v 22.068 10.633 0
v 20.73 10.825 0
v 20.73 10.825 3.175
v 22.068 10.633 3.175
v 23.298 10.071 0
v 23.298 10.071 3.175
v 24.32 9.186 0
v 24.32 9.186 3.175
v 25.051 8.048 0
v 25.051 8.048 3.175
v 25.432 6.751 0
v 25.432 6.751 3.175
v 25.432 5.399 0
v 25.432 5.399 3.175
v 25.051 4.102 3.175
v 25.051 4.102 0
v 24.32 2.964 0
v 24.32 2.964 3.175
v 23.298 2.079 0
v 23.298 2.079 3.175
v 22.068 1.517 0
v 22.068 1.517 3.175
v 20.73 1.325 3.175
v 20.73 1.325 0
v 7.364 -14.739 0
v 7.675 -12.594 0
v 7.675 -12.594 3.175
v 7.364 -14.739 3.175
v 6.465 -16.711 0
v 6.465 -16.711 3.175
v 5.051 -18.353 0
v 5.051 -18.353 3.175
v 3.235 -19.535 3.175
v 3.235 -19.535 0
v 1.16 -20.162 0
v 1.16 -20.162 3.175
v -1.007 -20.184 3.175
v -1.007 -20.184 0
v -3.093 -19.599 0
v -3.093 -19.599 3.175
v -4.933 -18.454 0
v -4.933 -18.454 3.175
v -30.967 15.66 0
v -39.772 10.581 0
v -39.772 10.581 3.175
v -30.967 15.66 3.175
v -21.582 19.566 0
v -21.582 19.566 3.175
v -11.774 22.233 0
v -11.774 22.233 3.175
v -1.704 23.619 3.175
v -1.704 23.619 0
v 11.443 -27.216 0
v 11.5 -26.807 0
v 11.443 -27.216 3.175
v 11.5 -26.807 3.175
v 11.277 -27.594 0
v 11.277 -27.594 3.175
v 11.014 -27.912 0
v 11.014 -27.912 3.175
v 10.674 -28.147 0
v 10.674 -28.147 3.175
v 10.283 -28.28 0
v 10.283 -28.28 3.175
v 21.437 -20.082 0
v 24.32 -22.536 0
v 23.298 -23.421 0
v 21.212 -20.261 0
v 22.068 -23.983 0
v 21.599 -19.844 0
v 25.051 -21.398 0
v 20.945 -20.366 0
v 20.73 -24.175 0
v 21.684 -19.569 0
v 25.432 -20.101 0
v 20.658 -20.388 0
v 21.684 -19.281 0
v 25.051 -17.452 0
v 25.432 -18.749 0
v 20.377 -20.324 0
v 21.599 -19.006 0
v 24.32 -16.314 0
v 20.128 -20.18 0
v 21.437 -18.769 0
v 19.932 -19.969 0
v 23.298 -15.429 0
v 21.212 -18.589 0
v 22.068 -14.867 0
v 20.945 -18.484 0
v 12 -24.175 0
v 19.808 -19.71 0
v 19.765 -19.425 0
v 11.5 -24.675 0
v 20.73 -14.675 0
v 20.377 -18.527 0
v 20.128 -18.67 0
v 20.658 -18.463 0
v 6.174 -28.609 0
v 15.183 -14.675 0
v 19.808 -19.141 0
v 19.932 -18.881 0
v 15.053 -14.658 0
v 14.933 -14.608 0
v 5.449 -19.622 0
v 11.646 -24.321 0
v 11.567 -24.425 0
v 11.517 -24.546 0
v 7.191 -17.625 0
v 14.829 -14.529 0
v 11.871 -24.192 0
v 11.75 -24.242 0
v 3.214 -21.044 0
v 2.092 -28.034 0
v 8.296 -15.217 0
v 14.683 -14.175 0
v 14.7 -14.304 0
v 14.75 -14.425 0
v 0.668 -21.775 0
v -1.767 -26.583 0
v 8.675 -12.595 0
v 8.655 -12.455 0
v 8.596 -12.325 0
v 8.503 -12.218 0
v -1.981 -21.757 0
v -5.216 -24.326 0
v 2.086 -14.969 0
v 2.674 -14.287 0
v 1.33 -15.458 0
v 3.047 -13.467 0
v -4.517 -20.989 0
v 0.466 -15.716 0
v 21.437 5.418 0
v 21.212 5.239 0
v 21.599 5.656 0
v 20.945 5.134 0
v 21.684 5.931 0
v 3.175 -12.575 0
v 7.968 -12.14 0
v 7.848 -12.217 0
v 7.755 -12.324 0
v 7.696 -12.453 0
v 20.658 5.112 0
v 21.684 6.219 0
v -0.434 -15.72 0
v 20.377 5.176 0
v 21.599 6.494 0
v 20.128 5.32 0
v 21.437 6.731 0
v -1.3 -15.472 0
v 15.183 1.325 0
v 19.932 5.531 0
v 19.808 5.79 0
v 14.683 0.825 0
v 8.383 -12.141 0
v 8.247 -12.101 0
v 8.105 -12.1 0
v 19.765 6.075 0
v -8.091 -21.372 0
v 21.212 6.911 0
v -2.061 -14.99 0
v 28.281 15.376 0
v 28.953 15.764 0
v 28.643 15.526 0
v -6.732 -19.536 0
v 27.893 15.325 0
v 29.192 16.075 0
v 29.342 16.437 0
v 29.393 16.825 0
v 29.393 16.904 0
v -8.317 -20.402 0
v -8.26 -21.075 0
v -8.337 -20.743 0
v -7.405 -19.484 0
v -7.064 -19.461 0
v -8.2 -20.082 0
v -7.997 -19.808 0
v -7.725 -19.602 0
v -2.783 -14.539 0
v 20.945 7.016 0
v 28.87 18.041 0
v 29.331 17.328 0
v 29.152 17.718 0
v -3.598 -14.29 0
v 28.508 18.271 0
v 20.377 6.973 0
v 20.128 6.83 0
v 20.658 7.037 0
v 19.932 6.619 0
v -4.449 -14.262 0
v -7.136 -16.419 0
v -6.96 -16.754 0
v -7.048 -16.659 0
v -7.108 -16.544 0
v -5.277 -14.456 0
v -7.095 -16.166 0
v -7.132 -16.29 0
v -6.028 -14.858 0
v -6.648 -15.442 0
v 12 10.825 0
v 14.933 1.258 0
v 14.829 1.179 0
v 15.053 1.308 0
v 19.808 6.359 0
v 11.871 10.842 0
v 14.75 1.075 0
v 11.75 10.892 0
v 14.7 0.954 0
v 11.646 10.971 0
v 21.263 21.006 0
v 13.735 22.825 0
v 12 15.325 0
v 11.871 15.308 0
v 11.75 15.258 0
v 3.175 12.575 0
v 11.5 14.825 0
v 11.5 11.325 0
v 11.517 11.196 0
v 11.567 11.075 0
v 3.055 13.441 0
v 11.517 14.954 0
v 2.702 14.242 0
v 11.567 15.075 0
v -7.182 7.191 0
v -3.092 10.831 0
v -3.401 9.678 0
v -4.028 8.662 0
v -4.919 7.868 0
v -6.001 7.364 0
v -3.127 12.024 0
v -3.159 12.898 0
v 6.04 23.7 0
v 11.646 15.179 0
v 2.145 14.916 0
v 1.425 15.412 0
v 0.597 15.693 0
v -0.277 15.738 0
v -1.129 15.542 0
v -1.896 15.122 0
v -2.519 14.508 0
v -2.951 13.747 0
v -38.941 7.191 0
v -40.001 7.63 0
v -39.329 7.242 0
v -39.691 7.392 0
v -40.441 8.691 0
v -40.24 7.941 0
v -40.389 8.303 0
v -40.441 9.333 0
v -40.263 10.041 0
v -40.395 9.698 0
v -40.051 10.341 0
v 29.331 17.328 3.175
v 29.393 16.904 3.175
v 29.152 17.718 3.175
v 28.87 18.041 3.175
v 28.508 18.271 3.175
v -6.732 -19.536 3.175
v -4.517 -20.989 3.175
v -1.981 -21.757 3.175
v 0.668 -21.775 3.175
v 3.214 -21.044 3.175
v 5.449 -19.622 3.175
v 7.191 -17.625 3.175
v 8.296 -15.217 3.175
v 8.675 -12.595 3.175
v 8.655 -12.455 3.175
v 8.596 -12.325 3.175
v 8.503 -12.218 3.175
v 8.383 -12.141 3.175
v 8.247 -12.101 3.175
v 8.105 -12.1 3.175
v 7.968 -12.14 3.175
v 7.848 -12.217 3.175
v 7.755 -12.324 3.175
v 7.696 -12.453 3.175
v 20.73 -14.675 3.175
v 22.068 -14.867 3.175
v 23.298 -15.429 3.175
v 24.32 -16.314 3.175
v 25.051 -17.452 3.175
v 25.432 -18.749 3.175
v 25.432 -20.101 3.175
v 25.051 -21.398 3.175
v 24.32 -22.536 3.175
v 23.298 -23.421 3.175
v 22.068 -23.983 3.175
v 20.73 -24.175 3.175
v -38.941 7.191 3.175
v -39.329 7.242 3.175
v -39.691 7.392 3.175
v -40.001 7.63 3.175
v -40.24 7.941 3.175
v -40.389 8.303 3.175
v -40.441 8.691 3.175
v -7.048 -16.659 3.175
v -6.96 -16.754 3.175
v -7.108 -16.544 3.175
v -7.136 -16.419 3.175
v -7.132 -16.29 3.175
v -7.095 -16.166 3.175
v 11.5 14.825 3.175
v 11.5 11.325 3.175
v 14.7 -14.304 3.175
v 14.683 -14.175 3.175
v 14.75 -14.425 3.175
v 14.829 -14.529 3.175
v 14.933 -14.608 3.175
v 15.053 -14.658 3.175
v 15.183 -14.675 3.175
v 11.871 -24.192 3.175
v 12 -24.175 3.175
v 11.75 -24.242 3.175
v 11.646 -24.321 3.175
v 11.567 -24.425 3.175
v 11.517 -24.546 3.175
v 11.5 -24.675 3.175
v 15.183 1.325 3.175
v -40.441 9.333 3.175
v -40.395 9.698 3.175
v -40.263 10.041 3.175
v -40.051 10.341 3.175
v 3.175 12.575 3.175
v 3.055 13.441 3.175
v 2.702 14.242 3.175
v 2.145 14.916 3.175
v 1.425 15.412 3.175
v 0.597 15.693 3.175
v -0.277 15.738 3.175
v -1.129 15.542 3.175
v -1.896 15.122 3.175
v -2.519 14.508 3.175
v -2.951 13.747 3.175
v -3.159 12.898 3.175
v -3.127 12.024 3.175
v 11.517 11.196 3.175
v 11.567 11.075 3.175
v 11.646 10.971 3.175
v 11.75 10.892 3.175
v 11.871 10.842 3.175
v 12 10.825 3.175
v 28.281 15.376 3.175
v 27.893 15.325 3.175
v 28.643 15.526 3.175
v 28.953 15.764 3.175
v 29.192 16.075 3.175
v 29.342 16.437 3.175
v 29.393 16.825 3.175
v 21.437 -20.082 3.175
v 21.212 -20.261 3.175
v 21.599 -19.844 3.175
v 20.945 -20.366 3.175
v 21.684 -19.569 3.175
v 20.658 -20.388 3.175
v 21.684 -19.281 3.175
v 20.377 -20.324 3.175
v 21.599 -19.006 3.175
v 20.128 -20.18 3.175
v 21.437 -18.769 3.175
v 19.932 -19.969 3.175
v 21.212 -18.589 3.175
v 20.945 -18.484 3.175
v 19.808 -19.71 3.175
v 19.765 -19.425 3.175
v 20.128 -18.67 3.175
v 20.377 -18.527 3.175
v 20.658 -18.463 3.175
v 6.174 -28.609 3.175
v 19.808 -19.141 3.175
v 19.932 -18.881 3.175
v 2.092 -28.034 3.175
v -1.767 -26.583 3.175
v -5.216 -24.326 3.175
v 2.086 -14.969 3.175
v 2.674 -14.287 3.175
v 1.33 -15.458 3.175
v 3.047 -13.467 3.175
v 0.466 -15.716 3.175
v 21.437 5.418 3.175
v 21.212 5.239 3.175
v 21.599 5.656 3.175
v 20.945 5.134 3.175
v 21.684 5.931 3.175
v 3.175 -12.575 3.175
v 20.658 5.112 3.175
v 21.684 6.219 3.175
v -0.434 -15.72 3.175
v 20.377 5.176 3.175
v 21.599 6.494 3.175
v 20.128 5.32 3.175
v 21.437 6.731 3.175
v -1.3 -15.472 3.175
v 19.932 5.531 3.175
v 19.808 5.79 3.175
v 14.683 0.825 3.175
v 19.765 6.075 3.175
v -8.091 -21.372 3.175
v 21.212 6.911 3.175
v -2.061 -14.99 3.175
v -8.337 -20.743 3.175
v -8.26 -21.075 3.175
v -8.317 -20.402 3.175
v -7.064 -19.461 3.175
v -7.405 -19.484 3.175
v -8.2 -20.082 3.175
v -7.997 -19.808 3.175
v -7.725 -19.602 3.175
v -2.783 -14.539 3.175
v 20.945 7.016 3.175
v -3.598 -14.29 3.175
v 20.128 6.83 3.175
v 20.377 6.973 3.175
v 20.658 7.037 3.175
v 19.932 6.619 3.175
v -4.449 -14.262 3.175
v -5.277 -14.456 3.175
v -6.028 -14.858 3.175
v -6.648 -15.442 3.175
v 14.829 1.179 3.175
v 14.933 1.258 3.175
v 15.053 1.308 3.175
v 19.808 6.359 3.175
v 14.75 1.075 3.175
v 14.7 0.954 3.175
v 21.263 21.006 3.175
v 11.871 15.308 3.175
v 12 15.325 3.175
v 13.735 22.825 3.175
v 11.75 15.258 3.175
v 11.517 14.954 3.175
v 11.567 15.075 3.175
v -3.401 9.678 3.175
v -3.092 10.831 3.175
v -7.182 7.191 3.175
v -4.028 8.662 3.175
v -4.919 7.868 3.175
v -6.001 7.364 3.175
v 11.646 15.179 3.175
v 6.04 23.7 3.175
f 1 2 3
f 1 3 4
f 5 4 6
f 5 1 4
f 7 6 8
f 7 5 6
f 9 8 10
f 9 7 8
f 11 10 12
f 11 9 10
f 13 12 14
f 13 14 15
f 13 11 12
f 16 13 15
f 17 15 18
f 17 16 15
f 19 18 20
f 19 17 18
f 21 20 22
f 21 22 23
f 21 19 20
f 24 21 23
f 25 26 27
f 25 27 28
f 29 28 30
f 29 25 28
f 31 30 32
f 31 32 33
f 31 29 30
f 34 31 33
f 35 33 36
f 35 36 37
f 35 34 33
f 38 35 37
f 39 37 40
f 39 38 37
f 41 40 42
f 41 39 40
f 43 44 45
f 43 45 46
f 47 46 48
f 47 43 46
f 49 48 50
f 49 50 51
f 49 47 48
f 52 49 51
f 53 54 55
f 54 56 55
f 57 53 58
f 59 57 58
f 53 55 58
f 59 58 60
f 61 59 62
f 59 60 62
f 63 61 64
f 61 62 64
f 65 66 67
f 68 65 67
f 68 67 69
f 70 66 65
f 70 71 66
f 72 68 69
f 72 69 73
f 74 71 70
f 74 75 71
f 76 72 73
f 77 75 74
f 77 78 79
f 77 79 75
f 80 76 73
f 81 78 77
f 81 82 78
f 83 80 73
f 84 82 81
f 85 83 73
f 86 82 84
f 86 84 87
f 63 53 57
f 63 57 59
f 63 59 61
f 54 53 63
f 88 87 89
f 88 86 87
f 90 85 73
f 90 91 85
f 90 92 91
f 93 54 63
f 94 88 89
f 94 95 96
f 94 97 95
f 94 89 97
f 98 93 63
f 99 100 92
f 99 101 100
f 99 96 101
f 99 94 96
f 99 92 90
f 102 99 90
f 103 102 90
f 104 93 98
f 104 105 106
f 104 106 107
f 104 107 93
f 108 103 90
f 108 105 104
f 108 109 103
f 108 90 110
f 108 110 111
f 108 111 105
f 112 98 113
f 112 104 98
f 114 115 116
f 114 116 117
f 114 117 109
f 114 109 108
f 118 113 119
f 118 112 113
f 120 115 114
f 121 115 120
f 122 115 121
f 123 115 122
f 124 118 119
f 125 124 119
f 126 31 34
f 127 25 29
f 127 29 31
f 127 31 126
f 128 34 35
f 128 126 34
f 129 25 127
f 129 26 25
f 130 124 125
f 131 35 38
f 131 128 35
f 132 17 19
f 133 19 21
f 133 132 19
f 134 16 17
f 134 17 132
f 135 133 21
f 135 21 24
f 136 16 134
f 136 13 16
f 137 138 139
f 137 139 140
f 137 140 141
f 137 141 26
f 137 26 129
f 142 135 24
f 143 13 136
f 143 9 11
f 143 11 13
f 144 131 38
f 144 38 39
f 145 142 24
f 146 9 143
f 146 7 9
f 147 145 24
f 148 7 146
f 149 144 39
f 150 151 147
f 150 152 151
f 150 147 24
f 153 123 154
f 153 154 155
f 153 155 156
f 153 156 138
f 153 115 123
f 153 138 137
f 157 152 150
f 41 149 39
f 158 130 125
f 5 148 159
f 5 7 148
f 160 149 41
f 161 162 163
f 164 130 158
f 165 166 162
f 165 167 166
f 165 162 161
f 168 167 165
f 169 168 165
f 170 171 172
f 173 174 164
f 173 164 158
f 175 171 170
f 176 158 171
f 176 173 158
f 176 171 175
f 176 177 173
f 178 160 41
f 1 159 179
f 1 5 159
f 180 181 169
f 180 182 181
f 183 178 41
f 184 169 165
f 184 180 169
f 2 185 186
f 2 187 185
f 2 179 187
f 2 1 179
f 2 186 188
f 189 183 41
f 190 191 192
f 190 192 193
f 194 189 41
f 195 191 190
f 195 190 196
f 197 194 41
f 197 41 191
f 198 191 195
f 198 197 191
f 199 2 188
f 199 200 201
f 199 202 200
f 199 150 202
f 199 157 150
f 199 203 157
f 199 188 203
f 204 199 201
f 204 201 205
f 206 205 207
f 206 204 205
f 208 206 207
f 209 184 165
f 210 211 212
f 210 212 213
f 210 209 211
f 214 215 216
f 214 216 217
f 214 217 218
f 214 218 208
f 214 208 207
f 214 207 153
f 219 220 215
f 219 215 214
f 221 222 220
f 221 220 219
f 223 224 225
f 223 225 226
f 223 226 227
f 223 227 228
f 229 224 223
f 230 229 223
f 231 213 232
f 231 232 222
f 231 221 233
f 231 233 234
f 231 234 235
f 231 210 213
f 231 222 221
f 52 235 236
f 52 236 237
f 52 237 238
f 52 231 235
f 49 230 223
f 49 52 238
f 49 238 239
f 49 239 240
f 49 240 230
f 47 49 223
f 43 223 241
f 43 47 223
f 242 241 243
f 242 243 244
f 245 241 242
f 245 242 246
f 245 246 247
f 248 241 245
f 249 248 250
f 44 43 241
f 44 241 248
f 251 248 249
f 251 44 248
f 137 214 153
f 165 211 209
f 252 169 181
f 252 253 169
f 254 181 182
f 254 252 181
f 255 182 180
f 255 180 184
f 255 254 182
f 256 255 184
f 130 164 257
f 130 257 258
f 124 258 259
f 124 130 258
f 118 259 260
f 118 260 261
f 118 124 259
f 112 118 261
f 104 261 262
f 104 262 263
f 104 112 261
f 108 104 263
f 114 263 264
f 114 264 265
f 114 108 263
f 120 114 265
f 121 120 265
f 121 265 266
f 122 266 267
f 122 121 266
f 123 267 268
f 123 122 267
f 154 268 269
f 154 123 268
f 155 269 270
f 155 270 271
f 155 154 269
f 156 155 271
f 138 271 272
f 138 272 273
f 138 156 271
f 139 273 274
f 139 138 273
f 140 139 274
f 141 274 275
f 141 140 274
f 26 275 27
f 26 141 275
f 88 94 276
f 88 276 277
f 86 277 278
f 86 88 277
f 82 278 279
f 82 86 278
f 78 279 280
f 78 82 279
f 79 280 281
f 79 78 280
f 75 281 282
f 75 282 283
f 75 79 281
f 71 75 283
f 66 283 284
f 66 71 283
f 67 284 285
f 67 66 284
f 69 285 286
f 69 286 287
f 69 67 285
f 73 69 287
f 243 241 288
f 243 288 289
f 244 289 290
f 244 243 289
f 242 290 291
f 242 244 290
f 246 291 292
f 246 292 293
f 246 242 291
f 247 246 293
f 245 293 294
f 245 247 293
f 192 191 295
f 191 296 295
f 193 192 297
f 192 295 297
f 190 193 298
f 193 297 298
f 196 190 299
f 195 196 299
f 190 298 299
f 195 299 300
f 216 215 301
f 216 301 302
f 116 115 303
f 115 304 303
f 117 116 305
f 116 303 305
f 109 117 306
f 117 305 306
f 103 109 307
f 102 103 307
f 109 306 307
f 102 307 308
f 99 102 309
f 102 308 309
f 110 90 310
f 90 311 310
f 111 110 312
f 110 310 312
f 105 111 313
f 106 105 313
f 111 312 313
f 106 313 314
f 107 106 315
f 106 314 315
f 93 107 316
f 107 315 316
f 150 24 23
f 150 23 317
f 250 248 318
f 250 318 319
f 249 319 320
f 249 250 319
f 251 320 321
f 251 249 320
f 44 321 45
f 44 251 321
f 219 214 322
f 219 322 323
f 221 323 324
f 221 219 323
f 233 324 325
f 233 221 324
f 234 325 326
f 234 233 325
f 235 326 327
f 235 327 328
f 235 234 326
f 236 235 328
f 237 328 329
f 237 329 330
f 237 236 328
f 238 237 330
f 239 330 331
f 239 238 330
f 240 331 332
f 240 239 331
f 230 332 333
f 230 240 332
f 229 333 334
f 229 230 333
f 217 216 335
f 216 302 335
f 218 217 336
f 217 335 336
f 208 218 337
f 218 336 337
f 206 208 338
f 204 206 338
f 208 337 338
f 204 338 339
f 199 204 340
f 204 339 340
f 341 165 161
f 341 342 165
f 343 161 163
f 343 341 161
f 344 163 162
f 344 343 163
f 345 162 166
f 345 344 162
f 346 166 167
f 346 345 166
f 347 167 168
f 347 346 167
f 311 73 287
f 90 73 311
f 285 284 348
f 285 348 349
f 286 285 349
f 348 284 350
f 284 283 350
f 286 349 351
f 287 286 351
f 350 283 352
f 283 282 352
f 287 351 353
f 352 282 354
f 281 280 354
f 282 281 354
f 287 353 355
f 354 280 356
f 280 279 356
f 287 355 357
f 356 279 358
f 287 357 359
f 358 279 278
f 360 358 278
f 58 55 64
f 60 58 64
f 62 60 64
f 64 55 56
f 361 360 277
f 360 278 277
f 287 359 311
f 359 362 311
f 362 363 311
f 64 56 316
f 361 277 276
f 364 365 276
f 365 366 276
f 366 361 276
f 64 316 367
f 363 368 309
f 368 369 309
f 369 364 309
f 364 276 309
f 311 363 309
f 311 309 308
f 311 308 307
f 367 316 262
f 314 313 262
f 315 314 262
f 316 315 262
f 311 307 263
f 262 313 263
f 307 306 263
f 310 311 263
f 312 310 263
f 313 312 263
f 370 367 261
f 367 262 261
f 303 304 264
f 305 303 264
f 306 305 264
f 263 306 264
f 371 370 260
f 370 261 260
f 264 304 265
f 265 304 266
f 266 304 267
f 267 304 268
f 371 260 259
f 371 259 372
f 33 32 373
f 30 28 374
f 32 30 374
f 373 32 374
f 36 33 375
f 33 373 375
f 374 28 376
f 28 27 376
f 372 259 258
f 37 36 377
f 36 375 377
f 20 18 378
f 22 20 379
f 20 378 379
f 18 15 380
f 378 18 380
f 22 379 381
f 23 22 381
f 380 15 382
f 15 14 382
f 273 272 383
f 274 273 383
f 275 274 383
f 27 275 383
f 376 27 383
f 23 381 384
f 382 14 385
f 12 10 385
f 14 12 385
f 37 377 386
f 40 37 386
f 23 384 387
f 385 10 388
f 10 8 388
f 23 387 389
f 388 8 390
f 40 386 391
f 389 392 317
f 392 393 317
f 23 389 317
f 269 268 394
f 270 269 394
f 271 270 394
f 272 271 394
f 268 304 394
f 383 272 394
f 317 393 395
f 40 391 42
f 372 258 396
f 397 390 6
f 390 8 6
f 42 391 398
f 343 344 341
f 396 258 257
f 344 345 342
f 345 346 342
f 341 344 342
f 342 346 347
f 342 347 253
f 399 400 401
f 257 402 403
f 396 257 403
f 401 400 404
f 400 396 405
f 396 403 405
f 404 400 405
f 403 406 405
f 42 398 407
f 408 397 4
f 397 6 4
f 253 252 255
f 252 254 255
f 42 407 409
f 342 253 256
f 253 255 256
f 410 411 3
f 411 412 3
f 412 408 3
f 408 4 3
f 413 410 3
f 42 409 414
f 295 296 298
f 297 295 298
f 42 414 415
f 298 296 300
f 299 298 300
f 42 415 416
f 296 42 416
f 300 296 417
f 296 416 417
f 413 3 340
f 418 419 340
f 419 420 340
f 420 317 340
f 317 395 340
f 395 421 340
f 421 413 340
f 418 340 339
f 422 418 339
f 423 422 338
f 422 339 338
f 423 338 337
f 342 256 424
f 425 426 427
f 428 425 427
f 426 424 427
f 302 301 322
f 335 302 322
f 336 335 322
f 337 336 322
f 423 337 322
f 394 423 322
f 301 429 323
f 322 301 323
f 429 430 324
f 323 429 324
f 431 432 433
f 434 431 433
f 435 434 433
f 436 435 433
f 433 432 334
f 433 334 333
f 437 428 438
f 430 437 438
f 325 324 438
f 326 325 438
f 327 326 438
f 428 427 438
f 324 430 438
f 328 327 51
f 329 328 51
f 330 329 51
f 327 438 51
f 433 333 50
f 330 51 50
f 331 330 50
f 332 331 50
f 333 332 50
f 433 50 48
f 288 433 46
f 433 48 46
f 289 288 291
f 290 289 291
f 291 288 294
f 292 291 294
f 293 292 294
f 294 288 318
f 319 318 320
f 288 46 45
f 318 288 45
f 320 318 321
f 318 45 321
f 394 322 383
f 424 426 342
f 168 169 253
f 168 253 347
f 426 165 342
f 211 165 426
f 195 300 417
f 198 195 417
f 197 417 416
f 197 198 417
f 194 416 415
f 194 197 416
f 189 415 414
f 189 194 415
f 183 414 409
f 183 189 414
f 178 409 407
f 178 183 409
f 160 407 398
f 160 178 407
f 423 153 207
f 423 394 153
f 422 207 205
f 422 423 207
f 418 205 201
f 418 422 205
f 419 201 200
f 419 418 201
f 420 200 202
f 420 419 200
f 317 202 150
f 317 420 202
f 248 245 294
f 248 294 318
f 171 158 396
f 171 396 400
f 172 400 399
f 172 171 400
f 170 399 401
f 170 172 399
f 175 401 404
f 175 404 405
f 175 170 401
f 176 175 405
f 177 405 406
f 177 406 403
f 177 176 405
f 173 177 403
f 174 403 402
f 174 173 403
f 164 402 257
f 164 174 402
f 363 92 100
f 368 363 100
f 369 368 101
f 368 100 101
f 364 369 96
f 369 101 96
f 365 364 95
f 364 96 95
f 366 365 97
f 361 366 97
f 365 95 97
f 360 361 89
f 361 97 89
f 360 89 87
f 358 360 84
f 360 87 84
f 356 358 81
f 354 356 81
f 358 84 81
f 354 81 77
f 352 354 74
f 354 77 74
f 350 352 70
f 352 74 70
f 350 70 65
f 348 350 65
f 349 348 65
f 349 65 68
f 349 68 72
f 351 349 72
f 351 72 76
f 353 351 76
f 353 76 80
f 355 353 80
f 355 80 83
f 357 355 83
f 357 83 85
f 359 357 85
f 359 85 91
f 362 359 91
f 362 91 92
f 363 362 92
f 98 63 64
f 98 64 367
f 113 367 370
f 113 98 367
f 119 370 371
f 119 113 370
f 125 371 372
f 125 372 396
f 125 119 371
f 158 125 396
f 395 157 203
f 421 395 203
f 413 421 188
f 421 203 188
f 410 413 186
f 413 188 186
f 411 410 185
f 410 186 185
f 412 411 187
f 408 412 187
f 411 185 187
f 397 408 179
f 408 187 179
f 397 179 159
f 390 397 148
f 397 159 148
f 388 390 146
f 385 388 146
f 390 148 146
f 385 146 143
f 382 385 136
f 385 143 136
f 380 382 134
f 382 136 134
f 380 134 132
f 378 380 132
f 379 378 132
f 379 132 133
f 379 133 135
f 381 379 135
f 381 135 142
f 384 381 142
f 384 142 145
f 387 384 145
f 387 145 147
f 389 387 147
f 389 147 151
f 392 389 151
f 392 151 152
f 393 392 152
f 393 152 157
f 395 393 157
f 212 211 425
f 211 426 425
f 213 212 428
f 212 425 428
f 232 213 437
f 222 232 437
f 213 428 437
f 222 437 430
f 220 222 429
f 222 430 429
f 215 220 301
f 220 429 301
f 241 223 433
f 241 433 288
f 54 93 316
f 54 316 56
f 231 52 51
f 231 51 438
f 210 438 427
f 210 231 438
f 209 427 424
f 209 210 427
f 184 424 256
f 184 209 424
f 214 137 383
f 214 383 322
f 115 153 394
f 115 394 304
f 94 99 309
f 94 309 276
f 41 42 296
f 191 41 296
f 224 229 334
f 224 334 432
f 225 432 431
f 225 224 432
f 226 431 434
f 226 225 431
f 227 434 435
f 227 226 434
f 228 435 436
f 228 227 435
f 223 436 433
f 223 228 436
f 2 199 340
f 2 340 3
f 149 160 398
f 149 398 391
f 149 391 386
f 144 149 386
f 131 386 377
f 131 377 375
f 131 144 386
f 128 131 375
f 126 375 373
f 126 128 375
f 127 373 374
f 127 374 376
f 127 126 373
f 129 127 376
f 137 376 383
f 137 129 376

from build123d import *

# Parameters (mm, degrees)
BOSS_EXTRUDE1_DEPTH = 3.175
FILLET1_R           = 0.5
CUT_EXTRUDE2_REACH  = 51.643
SKETCH3_R           = 0.9652
FILLET2_R           = 1.5


with BuildPart() as part:
    # Model → Boss-Extrude1 (new body)
    with BuildSketch(Plane.XY):
        with BuildLine():
            Line((14.682892141, 1.324956628), (14.682892141, -14.675043372))
            Line((14.682892141, -14.675043372), (20.7298505, -14.675043372))
            ThreePointArc((20.7298505, -14.675043372), (25.4798505, -19.425043372), (20.7298505, -24.175043372))
            Line((20.7298505, -24.175043372), (11.5, -24.175043372))
            Line((11.5, -24.175043372), (11.5, -28.004155183))
            ThreePointArc((11.5, -28.004155183), (0.71022918, -27.624612518), (-8.091185045, -21.371748005))
            ThreePointArc((-8.091185045, -21.371748005), (-8.108719309, -19.937278968), (-6.731529764, -19.535585272))
            ThreePointArc((-6.731529764, -19.535585272), (3.21430247, -21.04378196), (8.674974651, -12.595391853))
            ThreePointArc((8.674974651, -12.595391853), (8.175614462, -12.09535774), (7.674976202, -12.594112234))
            ThreePointArc((7.674976202, -12.594112234), (3.234931854, -19.534945465), (-4.933394903, -18.4543911))
            Line((-4.933394903, -18.4543911), (-7.231528234, -16.526028271))
            ThreePointArc((-7.231528234, -16.526028271), (-5.055570769, -14.381233606), (-2.061467679, -14.989741395))
            ThreePointArc((-2.061467679, -14.989741395), (1.32956104, -15.458208706), (3.175, -12.575000001))
            Line((3.175, -12.575000001), (3.175, 12.575000001))
            ThreePointArc((3.175, 12.575000001), (-0.276719482, 15.737918167), (-3.126764616, 12.023667038))
            ThreePointArc((-3.126764616, 12.023667038), (-4.027590212, 8.661740144), (-7.182015159, 7.190807634))
            Line((-7.182015159, 7.190807634), (-38.940555286, 7.190807634))
            ThreePointArc((-38.940555286, 7.190807634), (-40.001215458, 7.630147462), (-40.440555286, 8.690807634))
            Line((-40.440555286, 8.690807634), (-40.440555286, 9.332781994))
            ThreePointArc((-40.440555286, 9.332781994), (-40.26291966, 10.040844464), (-39.772085337, 10.581204108))
            ThreePointArc((-39.772085337, 10.581204108), (-21.582497329, 19.5655863), (-1.704175076, 23.619293202))
            ThreePointArc((-1.704175076, 23.619293202), (14.213621823, 22.738093196), (29.39280733, 17.865198893))
            Line((29.39280733, 17.865198893), (29.39280733, 15.324956628))
            Line((29.39280733, 15.324956628), (11.5, 15.324956628))
            Line((11.5, 15.324956628), (11.5, 10.824956628))
            Line((11.5, 10.824956628), (20.7298505, 10.824956628))
            ThreePointArc((20.7298505, 10.824956628), (25.4798505, 6.074956628), (20.7298505, 1.324956628))
            Line((20.7298505, 1.324956628), (14.682892141, 1.324956628))
        make_face()
    extrude(amount=BOSS_EXTRUDE1_DEPTH)

    # Fillet1
    fillet1_edges = [part.edges().sort_by_distance(p)[0] for p in [
        (11.5, 15.324956628, 1.5875),
        (11.5, 10.824956628, 1.5875),
        (14.682892141, 1.324956628, 1.5875),
        (14.682892141, -14.675043372, 1.5875),
        (11.5, -24.175043372, 1.5875),
        (-7.231528234, -16.526028271, 1.5875),
    ]]
    fillet(fillet1_edges, radius=FILLET1_R)

    # Sketch3 → Cut-Extrude2 (cut, up to next)
    with BuildSketch(Plane(origin=(0, 0, 0), x_dir=(-1, 0, 0), z_dir=(0, 0, -1)), mode=Mode.PRIVATE) as cut_extrude2_sk1:
        with Locations((-20.7298505, 6.074956628)):
            Circle(SKETCH3_R)
    cut_extrude2_tool1 = extrude(cut_extrude2_sk1.sketch, amount=-CUT_EXTRUDE2_REACH, mode=Mode.PRIVATE) & part.part
    # Sketch3 → Cut-Extrude2 (cut, up to next)
    with BuildSketch(Plane(origin=(0, 0, 0), x_dir=(-1, 0, 0), z_dir=(0, 0, -1)), mode=Mode.PRIVATE) as cut_extrude2_sk2:
        with Locations((-20.7298505, -19.425043372)):
            Circle(SKETCH3_R)
    cut_extrude2_tool2 = extrude(cut_extrude2_sk2.sketch, amount=-CUT_EXTRUDE2_REACH, mode=Mode.PRIVATE) & part.part
    add(cut_extrude2_tool1.solids().sort_by_distance((20.729851, 6.074957, 0))[0], mode=Mode.SUBTRACT)
    add(cut_extrude2_tool2.solids().sort_by_distance((20.729851, -19.425043, 0))[0], mode=Mode.SUBTRACT)

    # Fillet2
    fillet2_edges = [part.edges().sort_by_distance(p)[0] for p in [
        (29.39280733, 17.865198893, 1.5875),
        (29.39280733, 15.324956628, 1.5875),
        (11.5, -28.004155183, 1.5875),
    ]]
    fillet(fillet2_edges, radius=FILLET2_R)


solid = part.part
